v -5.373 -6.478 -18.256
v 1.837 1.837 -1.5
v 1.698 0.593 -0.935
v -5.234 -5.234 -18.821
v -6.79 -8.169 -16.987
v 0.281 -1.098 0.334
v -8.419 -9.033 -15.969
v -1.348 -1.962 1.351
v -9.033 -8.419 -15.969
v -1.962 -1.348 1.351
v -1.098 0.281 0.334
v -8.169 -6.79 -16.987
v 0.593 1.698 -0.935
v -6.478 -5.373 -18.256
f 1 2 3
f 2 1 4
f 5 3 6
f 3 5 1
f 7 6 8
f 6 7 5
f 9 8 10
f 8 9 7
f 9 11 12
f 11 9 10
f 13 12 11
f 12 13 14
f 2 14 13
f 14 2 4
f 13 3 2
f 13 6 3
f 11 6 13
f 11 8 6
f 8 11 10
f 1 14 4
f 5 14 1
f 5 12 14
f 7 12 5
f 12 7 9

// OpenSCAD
// Generated by generate_scads.py
rotate([180,30,45]) {
  scale([1.5,0.5,2.0]) {
    cylinder(h=10, r=2, center=false);
  }
}
